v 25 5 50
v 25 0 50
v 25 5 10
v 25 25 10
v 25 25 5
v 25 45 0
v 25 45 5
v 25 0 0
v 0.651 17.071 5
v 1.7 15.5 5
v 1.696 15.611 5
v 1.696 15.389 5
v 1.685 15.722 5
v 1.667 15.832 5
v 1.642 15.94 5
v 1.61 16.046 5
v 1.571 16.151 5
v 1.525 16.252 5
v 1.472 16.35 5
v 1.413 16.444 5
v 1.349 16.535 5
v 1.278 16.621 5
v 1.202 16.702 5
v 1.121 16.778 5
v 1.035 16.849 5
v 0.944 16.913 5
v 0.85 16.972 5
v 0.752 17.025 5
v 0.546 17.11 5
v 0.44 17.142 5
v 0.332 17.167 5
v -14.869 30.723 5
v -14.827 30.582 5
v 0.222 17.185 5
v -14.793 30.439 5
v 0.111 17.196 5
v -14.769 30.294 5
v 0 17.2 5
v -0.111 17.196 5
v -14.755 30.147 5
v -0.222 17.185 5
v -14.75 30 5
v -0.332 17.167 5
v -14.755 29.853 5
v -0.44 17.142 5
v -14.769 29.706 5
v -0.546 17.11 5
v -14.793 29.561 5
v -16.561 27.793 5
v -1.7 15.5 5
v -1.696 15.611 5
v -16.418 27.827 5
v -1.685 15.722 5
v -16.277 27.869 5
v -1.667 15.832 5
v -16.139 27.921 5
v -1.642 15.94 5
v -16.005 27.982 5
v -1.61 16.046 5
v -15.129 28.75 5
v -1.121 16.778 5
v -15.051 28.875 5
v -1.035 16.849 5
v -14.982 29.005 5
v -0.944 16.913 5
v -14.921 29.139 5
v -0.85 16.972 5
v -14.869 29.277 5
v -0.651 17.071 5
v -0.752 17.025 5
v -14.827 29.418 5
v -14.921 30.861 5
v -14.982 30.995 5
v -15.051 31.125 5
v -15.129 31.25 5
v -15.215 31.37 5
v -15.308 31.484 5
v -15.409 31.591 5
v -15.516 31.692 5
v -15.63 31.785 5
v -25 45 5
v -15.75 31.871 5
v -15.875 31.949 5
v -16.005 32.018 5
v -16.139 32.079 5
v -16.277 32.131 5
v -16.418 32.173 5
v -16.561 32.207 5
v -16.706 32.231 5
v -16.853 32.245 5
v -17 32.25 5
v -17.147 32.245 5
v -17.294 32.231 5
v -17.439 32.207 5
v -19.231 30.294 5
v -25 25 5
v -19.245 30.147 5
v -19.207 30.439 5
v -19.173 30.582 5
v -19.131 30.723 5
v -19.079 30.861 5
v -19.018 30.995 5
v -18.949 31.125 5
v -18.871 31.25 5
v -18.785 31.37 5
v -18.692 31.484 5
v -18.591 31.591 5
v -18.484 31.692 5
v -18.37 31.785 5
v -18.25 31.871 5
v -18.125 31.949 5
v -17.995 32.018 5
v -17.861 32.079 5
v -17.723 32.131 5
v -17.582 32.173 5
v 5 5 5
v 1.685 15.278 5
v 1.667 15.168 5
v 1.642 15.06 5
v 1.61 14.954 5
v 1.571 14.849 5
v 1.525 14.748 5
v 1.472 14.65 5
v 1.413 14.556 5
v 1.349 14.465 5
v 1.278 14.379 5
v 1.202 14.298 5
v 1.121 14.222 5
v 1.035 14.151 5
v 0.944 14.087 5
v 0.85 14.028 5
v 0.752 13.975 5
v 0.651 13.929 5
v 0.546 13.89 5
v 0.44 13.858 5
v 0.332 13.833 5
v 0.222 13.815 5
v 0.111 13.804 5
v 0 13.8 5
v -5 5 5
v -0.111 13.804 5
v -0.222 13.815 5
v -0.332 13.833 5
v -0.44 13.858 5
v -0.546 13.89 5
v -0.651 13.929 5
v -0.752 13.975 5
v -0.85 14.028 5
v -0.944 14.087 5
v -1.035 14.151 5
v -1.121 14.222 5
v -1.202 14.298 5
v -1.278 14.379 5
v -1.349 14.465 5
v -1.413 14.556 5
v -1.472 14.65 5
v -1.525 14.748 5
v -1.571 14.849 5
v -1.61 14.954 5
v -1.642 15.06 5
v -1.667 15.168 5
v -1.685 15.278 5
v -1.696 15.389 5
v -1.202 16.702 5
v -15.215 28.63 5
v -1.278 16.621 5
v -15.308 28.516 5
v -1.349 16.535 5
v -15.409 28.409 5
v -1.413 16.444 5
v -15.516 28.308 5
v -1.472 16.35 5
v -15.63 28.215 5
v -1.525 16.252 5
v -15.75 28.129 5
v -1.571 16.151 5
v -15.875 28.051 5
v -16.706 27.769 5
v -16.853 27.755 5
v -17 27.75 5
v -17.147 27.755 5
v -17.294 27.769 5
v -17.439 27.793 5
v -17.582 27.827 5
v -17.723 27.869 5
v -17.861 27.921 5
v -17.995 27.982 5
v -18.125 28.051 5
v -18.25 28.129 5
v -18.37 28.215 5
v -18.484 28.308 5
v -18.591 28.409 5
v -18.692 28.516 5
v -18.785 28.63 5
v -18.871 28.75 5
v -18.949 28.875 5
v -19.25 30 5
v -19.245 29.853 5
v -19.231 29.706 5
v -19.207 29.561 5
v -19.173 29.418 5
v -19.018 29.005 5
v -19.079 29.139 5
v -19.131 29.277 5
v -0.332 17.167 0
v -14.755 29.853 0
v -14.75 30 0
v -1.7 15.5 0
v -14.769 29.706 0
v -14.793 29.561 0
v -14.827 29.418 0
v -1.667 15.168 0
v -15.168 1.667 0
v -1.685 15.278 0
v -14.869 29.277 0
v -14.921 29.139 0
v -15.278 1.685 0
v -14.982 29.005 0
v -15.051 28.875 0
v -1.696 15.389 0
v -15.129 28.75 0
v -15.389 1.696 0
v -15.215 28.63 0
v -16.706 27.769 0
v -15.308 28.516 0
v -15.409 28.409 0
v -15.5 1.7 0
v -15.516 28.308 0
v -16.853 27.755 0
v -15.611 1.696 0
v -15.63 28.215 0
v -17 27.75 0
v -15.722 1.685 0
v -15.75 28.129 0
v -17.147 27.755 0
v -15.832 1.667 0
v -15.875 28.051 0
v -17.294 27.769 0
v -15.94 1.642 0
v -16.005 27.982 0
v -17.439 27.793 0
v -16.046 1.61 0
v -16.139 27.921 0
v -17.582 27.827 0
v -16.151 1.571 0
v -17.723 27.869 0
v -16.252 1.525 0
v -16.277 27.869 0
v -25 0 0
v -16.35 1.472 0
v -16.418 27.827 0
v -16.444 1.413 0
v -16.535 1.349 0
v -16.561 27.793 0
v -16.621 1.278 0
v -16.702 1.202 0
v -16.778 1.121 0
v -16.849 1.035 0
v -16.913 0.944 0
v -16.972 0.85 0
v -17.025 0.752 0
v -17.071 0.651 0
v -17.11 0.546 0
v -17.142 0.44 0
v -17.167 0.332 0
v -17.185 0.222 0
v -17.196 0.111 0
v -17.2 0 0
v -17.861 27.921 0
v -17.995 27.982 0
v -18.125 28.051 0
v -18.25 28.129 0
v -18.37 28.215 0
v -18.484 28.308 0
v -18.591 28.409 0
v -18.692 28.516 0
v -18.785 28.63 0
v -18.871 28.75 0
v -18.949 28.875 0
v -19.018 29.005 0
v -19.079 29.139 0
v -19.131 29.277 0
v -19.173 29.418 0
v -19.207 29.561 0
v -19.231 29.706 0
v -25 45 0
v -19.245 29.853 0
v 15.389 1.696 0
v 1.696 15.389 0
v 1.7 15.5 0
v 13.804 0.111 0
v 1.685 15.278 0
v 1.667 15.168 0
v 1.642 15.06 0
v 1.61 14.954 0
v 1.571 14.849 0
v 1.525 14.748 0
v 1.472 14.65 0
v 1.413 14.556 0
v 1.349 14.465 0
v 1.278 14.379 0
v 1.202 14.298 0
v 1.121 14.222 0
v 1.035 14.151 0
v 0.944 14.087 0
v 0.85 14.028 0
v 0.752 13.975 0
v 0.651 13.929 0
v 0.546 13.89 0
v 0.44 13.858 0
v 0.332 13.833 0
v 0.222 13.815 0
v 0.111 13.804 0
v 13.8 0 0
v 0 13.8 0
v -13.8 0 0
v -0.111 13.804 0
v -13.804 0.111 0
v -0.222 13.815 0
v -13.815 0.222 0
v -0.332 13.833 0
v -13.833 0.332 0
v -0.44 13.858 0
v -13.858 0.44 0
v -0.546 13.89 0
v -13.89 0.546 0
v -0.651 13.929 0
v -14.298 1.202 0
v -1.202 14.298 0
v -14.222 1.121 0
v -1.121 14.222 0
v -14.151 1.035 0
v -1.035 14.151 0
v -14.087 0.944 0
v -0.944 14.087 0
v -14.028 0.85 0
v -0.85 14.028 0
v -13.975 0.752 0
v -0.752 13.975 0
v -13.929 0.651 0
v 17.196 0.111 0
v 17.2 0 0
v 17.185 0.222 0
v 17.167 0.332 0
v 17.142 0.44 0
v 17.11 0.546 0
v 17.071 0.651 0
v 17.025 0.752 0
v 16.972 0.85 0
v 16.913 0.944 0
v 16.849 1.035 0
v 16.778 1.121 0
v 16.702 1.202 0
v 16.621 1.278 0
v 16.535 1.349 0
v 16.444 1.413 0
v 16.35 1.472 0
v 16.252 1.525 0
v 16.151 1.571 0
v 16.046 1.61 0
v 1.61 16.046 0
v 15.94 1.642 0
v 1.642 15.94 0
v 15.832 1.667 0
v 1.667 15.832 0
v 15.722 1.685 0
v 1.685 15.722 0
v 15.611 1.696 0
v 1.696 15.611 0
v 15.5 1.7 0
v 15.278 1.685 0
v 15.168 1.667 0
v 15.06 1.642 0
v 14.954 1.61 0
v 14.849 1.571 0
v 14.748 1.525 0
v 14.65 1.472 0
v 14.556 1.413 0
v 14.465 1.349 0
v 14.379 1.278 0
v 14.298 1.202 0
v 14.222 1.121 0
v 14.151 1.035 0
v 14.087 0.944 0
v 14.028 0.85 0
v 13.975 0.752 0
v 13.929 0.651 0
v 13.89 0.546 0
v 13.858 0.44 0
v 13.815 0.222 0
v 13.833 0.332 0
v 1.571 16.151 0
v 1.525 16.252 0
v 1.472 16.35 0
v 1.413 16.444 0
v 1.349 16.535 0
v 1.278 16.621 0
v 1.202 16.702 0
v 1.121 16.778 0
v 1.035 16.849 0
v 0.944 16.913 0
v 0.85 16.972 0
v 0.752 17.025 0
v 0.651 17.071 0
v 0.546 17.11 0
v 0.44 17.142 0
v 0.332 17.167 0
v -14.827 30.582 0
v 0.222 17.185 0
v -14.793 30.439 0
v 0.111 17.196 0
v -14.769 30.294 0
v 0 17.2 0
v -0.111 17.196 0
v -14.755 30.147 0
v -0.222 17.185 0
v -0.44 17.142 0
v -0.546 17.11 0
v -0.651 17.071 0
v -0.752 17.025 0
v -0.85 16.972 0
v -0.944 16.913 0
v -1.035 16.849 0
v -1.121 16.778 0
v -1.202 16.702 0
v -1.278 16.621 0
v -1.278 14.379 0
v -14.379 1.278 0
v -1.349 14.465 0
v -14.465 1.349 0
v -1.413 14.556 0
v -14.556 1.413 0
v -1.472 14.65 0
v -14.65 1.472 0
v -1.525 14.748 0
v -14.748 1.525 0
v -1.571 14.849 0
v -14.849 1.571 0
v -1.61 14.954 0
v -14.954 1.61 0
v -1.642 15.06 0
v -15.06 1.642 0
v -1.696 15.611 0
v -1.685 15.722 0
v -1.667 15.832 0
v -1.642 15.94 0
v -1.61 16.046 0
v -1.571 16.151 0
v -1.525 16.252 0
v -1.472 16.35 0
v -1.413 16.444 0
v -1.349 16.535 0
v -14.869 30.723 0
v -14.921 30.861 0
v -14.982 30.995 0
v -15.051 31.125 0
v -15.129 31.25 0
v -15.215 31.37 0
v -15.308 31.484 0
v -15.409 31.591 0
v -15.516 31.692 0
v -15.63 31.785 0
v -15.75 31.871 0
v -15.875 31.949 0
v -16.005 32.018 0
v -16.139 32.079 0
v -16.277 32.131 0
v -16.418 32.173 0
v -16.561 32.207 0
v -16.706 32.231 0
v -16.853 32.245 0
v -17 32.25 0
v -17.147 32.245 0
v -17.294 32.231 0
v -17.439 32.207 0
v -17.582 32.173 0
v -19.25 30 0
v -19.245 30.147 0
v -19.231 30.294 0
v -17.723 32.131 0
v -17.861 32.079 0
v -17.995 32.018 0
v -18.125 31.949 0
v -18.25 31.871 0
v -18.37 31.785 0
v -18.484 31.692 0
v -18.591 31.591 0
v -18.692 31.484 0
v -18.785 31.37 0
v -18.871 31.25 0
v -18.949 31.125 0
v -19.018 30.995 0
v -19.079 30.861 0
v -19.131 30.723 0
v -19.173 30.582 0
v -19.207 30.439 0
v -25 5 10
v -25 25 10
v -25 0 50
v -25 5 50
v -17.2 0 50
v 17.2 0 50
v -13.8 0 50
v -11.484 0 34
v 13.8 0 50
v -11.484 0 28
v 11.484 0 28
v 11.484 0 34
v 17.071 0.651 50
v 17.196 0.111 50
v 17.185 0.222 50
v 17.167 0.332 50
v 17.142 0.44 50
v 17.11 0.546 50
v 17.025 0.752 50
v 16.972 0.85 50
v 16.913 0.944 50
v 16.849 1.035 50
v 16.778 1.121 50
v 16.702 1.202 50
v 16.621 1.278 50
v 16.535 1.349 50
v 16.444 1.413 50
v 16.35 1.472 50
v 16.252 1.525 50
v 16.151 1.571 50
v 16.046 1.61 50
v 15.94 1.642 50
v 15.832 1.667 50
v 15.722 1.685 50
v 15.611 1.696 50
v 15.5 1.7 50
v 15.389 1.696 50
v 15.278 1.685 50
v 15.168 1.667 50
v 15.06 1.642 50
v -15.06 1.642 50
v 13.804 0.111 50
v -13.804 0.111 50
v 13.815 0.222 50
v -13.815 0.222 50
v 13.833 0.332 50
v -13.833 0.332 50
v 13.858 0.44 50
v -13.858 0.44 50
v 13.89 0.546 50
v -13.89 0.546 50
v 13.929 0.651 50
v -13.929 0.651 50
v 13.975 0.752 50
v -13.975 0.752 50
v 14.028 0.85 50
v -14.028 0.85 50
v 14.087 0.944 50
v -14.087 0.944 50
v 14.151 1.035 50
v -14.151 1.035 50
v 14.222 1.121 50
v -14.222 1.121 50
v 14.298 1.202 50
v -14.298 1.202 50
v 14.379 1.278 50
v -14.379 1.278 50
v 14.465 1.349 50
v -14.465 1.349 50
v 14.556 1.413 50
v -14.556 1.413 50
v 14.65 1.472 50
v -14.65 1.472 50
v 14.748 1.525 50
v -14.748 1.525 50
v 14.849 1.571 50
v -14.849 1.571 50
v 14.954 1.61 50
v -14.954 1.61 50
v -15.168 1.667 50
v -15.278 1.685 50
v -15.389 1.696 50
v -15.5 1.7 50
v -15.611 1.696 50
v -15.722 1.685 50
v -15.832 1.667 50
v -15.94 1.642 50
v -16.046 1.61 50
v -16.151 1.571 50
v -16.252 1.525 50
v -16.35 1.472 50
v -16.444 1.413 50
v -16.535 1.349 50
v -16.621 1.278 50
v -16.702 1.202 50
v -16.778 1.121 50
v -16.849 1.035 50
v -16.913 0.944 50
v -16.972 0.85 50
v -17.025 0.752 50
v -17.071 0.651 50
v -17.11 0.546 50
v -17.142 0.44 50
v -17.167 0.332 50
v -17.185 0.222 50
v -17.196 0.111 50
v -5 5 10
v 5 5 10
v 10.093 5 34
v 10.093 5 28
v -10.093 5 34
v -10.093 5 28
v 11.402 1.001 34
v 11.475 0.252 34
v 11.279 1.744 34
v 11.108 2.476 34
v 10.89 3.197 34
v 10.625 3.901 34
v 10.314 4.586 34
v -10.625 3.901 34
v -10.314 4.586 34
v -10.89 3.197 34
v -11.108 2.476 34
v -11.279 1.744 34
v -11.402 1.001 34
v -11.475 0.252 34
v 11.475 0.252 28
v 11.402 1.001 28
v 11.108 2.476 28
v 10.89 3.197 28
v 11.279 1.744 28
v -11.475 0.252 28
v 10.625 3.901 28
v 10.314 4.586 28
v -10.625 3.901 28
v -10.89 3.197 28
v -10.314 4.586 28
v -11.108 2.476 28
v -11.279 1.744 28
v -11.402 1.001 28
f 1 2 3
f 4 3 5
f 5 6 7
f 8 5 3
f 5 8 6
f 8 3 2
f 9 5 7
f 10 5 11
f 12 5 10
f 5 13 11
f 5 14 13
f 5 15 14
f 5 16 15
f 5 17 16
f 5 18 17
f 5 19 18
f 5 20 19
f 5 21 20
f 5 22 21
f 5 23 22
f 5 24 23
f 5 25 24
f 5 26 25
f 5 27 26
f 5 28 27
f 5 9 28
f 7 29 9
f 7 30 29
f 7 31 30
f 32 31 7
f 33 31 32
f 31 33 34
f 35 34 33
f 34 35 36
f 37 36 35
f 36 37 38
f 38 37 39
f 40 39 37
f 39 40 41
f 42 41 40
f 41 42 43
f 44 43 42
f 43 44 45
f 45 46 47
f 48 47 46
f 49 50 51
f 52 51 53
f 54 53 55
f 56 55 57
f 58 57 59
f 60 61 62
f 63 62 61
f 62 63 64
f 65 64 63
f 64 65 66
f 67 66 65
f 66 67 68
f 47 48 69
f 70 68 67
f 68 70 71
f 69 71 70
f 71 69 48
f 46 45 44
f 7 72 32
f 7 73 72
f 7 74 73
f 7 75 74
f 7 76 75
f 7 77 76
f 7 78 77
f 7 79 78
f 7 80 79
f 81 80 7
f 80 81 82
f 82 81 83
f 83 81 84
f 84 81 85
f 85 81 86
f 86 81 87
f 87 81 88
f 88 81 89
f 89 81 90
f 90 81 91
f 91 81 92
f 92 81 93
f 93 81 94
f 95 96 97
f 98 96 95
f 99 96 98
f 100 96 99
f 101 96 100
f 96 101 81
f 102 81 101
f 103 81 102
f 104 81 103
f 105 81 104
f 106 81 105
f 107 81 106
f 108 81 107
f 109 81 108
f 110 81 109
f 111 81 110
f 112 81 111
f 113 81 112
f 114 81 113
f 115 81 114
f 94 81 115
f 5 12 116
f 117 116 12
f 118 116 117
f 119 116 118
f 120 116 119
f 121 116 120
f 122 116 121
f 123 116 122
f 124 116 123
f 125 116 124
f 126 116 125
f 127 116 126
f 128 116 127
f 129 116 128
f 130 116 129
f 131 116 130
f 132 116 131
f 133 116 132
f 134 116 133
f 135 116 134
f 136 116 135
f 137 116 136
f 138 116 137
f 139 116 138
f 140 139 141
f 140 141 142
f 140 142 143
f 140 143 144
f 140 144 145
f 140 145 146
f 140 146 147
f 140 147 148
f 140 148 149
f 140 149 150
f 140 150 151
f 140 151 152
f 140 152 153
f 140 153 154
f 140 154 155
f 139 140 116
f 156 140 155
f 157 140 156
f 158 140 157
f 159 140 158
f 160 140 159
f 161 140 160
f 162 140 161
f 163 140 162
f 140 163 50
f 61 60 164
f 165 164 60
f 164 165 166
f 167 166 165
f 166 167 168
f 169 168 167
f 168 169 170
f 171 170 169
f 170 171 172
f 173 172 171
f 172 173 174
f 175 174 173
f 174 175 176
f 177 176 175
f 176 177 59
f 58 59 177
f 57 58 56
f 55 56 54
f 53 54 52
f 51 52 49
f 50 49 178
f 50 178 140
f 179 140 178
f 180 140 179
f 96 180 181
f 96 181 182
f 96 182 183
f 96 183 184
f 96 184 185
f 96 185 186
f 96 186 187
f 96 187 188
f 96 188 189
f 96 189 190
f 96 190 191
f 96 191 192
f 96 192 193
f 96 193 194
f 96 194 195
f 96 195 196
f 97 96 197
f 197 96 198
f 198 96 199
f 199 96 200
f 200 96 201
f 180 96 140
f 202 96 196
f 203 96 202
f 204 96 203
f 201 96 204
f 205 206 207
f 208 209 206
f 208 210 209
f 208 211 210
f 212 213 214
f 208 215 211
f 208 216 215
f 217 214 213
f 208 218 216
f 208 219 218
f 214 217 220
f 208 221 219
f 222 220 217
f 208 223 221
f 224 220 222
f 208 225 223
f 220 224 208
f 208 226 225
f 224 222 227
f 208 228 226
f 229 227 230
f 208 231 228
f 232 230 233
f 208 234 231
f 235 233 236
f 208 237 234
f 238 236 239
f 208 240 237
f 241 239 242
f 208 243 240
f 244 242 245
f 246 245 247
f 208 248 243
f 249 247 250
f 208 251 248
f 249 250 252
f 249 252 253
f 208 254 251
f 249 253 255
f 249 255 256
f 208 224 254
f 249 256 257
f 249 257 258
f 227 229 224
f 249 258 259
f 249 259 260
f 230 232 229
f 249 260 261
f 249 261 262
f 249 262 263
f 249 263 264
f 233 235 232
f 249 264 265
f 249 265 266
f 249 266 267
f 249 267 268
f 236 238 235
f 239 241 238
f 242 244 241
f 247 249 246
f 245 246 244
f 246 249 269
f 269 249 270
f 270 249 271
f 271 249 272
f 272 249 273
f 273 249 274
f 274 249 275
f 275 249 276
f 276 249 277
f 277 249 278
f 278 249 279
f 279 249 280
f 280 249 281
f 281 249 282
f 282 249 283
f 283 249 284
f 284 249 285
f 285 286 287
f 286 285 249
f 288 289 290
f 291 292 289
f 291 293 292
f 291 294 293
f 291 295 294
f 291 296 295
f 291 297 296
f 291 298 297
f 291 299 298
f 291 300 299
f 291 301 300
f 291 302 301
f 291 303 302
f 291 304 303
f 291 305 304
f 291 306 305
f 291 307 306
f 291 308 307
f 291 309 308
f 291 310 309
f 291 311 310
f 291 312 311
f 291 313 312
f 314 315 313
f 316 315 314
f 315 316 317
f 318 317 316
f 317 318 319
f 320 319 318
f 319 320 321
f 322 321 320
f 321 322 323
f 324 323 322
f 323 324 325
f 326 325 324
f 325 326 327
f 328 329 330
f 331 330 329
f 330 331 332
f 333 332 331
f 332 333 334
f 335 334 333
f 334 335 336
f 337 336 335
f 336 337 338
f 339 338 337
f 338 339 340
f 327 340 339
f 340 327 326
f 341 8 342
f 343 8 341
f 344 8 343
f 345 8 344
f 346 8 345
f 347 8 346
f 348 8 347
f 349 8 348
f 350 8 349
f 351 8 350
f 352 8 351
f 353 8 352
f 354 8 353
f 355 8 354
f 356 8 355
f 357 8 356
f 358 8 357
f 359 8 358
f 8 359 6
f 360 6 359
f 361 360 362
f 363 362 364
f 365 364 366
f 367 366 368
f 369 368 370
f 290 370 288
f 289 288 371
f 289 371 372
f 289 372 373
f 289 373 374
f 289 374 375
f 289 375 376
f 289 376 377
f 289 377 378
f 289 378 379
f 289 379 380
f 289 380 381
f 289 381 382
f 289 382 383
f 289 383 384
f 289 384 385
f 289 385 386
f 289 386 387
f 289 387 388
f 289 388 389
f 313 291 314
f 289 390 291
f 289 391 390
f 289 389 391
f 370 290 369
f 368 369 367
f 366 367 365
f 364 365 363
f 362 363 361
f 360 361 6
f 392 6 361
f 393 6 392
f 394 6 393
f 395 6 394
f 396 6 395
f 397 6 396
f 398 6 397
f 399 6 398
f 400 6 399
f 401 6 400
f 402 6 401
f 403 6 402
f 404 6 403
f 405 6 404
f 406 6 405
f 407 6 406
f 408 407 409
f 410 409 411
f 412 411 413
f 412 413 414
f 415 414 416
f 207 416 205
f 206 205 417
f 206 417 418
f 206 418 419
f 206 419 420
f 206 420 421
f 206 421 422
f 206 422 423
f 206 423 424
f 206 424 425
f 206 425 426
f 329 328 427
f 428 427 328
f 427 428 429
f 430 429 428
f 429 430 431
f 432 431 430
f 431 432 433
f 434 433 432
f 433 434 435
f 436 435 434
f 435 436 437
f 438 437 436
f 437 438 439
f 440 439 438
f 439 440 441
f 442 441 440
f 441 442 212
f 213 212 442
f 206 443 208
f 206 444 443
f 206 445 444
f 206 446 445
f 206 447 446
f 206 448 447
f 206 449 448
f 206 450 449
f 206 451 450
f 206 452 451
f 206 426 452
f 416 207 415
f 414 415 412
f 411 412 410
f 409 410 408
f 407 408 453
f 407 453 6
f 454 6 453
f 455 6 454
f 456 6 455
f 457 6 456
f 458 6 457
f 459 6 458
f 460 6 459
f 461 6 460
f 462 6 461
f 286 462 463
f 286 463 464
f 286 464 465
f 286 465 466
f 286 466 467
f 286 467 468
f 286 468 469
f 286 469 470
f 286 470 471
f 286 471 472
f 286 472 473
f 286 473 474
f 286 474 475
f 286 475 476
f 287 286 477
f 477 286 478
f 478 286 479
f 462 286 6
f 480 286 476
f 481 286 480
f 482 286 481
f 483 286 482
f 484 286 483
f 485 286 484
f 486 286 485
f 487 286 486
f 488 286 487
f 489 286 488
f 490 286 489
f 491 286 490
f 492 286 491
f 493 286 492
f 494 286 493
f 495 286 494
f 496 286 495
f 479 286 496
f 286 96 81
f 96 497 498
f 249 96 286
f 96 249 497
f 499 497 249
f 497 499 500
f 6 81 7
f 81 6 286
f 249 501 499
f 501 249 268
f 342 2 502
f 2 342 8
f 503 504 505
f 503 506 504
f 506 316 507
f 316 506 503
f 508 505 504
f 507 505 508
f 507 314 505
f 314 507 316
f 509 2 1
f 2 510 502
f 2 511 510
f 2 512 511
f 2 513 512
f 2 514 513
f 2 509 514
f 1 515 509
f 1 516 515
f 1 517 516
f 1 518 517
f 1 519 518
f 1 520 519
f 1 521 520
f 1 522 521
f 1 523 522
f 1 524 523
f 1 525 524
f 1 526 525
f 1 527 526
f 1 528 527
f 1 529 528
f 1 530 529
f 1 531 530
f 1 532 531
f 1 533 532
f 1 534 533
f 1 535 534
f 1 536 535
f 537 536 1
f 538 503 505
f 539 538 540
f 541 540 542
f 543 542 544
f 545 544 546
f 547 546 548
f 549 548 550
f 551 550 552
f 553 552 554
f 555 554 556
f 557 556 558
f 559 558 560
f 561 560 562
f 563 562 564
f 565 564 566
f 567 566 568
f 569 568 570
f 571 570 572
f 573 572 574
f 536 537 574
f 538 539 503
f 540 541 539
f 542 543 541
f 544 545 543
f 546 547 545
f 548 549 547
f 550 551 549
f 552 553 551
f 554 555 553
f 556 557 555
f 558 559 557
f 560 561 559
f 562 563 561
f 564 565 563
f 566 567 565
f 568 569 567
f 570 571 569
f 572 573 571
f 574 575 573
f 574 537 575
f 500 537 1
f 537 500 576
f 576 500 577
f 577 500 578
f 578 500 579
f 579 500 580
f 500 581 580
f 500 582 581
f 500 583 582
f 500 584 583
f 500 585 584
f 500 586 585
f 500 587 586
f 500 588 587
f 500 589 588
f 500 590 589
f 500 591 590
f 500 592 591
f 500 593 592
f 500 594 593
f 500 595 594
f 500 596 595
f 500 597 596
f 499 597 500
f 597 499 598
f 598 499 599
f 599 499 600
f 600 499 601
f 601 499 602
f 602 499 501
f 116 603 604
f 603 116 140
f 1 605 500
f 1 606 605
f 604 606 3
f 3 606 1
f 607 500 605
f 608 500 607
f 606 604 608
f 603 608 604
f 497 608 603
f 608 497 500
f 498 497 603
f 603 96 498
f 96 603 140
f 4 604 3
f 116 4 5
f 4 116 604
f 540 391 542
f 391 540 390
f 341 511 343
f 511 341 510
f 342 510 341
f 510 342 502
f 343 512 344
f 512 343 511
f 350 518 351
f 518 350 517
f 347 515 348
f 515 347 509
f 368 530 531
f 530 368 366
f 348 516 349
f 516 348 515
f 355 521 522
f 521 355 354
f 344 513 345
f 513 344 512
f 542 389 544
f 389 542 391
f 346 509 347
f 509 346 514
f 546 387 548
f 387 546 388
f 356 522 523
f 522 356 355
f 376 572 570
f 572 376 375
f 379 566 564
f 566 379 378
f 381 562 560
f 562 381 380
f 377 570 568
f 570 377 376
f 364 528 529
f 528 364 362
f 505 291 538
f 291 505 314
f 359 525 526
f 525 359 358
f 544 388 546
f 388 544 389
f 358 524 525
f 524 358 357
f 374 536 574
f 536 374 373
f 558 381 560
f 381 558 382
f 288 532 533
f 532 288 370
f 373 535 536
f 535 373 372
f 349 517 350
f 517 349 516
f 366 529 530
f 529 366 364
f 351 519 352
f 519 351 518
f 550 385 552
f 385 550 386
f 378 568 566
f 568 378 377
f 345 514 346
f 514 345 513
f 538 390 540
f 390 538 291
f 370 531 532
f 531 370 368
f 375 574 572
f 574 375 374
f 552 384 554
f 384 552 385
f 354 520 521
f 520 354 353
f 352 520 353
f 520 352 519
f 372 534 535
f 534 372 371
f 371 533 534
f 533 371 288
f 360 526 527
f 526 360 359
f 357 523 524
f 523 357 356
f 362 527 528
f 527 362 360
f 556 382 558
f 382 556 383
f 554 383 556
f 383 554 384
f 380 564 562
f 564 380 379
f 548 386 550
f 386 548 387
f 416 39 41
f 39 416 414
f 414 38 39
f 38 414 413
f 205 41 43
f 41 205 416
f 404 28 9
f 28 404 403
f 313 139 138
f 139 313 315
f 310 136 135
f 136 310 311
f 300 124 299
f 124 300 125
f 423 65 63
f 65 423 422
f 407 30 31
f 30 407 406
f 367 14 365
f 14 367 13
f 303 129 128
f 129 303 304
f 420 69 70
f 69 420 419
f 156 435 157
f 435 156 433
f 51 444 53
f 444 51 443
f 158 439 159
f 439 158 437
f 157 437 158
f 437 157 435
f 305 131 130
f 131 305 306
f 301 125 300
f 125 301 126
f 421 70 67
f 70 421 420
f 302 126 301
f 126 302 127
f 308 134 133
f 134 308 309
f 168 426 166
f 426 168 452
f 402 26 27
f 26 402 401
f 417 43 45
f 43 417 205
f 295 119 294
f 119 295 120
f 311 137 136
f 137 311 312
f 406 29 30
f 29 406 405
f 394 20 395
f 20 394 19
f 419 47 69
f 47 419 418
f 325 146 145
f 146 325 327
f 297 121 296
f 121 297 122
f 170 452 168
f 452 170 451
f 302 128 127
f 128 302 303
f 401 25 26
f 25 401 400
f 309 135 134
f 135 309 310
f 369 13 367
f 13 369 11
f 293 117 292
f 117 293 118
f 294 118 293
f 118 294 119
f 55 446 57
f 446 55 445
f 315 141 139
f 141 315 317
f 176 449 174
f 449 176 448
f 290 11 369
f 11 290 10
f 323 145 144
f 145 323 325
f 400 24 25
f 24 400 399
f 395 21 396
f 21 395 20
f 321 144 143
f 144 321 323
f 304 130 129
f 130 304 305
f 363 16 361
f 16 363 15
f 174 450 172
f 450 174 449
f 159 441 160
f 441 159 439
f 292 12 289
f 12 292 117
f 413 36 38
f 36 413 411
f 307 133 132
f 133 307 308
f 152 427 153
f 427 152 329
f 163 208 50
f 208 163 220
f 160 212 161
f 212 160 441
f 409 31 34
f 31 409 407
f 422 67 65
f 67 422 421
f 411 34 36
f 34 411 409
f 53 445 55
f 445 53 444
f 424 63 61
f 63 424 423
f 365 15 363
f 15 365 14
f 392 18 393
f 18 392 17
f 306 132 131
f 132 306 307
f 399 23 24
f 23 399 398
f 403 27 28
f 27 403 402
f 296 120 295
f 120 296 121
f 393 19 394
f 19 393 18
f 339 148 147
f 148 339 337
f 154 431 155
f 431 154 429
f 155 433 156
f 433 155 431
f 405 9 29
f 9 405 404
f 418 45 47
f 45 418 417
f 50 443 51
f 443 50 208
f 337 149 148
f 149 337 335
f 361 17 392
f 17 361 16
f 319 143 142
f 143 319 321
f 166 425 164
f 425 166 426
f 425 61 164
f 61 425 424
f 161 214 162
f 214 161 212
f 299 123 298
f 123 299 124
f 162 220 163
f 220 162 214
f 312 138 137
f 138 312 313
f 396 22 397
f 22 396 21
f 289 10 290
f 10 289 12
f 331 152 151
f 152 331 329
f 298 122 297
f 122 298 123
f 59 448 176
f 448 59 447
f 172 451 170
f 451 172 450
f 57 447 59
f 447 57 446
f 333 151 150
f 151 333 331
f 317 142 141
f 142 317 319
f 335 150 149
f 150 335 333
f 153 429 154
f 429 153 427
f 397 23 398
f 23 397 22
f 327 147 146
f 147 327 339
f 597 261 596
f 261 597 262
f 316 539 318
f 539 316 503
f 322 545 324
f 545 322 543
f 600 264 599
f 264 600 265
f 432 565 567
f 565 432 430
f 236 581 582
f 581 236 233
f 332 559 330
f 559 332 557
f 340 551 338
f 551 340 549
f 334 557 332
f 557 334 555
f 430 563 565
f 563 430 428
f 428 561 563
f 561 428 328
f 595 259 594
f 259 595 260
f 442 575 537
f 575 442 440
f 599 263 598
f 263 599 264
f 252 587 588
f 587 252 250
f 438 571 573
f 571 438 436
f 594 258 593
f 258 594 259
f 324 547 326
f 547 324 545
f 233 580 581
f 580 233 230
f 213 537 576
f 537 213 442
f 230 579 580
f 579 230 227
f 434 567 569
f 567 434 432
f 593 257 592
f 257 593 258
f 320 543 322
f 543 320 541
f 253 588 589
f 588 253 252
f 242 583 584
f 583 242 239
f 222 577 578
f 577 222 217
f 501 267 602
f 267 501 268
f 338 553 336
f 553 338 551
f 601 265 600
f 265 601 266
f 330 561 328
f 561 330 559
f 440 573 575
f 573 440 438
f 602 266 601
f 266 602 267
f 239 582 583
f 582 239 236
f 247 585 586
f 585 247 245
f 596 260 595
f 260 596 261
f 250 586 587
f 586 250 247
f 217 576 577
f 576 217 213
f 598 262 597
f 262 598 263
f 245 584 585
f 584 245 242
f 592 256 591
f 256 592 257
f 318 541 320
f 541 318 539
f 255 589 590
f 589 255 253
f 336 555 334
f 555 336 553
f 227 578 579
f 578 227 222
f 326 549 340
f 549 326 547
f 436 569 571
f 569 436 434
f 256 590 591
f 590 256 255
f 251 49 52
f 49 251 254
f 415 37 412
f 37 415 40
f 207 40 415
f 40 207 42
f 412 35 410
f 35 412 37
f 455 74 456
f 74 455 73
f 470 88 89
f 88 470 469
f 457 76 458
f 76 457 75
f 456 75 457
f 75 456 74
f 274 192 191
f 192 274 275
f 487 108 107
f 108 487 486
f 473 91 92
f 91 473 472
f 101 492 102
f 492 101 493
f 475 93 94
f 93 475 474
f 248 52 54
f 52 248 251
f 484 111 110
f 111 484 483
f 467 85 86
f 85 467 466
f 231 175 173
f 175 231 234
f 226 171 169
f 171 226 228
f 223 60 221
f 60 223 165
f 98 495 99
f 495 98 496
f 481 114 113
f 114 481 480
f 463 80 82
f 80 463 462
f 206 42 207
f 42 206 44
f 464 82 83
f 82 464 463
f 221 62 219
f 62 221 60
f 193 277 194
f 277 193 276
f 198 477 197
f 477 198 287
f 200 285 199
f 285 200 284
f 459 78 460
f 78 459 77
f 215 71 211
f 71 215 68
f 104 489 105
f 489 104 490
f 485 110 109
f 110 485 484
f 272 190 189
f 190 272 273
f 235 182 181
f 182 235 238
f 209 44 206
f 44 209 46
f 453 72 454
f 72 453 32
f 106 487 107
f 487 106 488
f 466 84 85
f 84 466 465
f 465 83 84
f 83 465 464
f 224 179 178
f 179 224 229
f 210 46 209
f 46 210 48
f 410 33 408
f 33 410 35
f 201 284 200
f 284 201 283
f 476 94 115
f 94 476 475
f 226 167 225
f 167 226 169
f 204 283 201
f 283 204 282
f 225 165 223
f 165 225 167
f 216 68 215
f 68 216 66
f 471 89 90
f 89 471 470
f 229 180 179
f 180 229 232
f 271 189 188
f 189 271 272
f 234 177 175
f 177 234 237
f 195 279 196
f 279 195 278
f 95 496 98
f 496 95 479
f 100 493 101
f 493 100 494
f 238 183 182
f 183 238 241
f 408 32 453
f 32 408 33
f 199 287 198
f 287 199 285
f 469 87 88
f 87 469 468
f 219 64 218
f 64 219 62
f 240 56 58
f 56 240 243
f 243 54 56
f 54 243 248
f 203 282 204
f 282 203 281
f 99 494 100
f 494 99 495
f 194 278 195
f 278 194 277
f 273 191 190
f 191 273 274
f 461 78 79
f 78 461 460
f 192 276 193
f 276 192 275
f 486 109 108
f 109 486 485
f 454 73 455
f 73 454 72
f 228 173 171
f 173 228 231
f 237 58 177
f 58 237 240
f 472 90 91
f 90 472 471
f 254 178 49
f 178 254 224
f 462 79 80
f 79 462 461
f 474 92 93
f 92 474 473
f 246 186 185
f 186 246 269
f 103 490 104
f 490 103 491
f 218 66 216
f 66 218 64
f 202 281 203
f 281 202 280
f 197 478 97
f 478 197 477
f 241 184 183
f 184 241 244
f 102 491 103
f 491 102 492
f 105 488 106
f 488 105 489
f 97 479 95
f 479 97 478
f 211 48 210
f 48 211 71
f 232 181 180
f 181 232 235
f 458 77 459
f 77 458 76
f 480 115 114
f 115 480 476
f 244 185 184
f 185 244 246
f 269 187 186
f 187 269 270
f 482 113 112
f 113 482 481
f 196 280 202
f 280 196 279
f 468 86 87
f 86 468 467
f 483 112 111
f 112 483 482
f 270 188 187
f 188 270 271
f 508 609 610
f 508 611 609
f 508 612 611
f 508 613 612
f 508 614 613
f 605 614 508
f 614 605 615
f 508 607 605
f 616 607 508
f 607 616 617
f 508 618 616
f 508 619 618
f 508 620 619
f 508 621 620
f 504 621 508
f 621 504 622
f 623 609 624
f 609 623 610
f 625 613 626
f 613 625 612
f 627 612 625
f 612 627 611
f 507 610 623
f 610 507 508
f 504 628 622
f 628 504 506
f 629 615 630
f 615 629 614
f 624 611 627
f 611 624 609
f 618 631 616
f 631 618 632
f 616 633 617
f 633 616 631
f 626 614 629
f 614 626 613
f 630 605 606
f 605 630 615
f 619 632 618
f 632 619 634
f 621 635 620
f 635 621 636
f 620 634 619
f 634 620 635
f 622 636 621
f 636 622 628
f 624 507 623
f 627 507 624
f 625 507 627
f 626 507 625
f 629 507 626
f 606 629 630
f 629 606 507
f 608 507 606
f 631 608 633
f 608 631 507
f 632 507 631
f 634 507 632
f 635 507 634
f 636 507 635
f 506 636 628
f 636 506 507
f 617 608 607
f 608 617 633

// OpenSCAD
// L-shaped mounting bracket for NEMA 17 stepper motor
// Print orientation: base plate on bed (z = 0), motor plate builds upward (+Z)

// ---------------- Parameters ----------------
base_x0      = -25;    // base plate: x start
base_x1      = 25;     // base plate: x end
base_y0      = 0;      // base plate: y start
base_y1      = 45;     // base plate: y end
base_z1      = 5;      // base plate: z end (thickness)

hole_x       = -17;    // M4 through-hole x position (both holes)
hole_y       = 30;     // M4 through-hole y position (both holes)
hole_d       = 4.5;    // M4 hole diameter

plate_x0     = -25;    // motor plate: x start
plate_x1     = 25;     // motor plate: x end
plate_y0     = 0;      // motor plate: y start
plate_y1     = 5;      // motor plate: y end (thickness)
plate_z1     = 50;     // motor plate: z end (height)

boss_d       = 23;     // motor centring boss hole diameter
boss_x       = 0;      // boss hole centre x
boss_z       = 28;     // boss hole centre z

screw_d      = 3.4;    // M3 screw hole diameter
screw_pitch  = 31;     // square pattern side length

gusset_t     = 5;      // gusset thickness (X direction)
gusset_leg   = 20;     // right triangle leg length (Y and Z)
gusset_x0    = -25;    // left gusset x start
gusset_x1    = 25;     // right gusset x end

eps          = 0.5;    // cutter overshoot past faces

$fn = 96;

// ---------------- Model ----------------
difference() {
    union() {
        // Base plate
        translate([base_x0, base_y0, 0])
            cube([base_x1 - base_x0, base_y1 - base_y0, base_z1]);

        // Motor plate
        translate([plate_x0, plate_y0, 0])
            cube([plate_x1 - plate_x0, plate_y1 - plate_y0, plate_z1]);

        // Left gusset (flush with left edge)
        translate([gusset_x0, 0, 5])
            linear_extrude(height = gusset_t)
                polygon(points = [
                    [0, 5],
                    [gusset_leg, 5],
                    [0, gusset_leg + 5]
                ]);

        // Right gusset (flush with right edge)
        translate([gusset_x1, 0, 5])
            linear_extrude(height = gusset_t)
                polygon(points = [
                    [0, 5],
                    [-gusset_leg, 5],
                    [0, gusset_leg + 5]
                ]);
    }

    // Base plate through-holes (M4)
    translate([hole_x, hole_y, -eps])
        cylinder(d = hole_d, h = base_z1 + 2 * eps);

    // Motor boss hole (through along Y)
    translate([boss_x, plate_y0 - eps, boss_z])
        cylinder(d = boss_d, h = plate_y1 - plate_y0 + 2 * eps);

    // M3 screw holes on square pattern centred on boss hole
    for (a = [0, 90, 180, 270])
        rotate([0, 0, a])
            translate([screw_pitch / 2, 0, -eps])
                cylinder(d = screw_d, h = plate_z1 + 2 * eps);
}
